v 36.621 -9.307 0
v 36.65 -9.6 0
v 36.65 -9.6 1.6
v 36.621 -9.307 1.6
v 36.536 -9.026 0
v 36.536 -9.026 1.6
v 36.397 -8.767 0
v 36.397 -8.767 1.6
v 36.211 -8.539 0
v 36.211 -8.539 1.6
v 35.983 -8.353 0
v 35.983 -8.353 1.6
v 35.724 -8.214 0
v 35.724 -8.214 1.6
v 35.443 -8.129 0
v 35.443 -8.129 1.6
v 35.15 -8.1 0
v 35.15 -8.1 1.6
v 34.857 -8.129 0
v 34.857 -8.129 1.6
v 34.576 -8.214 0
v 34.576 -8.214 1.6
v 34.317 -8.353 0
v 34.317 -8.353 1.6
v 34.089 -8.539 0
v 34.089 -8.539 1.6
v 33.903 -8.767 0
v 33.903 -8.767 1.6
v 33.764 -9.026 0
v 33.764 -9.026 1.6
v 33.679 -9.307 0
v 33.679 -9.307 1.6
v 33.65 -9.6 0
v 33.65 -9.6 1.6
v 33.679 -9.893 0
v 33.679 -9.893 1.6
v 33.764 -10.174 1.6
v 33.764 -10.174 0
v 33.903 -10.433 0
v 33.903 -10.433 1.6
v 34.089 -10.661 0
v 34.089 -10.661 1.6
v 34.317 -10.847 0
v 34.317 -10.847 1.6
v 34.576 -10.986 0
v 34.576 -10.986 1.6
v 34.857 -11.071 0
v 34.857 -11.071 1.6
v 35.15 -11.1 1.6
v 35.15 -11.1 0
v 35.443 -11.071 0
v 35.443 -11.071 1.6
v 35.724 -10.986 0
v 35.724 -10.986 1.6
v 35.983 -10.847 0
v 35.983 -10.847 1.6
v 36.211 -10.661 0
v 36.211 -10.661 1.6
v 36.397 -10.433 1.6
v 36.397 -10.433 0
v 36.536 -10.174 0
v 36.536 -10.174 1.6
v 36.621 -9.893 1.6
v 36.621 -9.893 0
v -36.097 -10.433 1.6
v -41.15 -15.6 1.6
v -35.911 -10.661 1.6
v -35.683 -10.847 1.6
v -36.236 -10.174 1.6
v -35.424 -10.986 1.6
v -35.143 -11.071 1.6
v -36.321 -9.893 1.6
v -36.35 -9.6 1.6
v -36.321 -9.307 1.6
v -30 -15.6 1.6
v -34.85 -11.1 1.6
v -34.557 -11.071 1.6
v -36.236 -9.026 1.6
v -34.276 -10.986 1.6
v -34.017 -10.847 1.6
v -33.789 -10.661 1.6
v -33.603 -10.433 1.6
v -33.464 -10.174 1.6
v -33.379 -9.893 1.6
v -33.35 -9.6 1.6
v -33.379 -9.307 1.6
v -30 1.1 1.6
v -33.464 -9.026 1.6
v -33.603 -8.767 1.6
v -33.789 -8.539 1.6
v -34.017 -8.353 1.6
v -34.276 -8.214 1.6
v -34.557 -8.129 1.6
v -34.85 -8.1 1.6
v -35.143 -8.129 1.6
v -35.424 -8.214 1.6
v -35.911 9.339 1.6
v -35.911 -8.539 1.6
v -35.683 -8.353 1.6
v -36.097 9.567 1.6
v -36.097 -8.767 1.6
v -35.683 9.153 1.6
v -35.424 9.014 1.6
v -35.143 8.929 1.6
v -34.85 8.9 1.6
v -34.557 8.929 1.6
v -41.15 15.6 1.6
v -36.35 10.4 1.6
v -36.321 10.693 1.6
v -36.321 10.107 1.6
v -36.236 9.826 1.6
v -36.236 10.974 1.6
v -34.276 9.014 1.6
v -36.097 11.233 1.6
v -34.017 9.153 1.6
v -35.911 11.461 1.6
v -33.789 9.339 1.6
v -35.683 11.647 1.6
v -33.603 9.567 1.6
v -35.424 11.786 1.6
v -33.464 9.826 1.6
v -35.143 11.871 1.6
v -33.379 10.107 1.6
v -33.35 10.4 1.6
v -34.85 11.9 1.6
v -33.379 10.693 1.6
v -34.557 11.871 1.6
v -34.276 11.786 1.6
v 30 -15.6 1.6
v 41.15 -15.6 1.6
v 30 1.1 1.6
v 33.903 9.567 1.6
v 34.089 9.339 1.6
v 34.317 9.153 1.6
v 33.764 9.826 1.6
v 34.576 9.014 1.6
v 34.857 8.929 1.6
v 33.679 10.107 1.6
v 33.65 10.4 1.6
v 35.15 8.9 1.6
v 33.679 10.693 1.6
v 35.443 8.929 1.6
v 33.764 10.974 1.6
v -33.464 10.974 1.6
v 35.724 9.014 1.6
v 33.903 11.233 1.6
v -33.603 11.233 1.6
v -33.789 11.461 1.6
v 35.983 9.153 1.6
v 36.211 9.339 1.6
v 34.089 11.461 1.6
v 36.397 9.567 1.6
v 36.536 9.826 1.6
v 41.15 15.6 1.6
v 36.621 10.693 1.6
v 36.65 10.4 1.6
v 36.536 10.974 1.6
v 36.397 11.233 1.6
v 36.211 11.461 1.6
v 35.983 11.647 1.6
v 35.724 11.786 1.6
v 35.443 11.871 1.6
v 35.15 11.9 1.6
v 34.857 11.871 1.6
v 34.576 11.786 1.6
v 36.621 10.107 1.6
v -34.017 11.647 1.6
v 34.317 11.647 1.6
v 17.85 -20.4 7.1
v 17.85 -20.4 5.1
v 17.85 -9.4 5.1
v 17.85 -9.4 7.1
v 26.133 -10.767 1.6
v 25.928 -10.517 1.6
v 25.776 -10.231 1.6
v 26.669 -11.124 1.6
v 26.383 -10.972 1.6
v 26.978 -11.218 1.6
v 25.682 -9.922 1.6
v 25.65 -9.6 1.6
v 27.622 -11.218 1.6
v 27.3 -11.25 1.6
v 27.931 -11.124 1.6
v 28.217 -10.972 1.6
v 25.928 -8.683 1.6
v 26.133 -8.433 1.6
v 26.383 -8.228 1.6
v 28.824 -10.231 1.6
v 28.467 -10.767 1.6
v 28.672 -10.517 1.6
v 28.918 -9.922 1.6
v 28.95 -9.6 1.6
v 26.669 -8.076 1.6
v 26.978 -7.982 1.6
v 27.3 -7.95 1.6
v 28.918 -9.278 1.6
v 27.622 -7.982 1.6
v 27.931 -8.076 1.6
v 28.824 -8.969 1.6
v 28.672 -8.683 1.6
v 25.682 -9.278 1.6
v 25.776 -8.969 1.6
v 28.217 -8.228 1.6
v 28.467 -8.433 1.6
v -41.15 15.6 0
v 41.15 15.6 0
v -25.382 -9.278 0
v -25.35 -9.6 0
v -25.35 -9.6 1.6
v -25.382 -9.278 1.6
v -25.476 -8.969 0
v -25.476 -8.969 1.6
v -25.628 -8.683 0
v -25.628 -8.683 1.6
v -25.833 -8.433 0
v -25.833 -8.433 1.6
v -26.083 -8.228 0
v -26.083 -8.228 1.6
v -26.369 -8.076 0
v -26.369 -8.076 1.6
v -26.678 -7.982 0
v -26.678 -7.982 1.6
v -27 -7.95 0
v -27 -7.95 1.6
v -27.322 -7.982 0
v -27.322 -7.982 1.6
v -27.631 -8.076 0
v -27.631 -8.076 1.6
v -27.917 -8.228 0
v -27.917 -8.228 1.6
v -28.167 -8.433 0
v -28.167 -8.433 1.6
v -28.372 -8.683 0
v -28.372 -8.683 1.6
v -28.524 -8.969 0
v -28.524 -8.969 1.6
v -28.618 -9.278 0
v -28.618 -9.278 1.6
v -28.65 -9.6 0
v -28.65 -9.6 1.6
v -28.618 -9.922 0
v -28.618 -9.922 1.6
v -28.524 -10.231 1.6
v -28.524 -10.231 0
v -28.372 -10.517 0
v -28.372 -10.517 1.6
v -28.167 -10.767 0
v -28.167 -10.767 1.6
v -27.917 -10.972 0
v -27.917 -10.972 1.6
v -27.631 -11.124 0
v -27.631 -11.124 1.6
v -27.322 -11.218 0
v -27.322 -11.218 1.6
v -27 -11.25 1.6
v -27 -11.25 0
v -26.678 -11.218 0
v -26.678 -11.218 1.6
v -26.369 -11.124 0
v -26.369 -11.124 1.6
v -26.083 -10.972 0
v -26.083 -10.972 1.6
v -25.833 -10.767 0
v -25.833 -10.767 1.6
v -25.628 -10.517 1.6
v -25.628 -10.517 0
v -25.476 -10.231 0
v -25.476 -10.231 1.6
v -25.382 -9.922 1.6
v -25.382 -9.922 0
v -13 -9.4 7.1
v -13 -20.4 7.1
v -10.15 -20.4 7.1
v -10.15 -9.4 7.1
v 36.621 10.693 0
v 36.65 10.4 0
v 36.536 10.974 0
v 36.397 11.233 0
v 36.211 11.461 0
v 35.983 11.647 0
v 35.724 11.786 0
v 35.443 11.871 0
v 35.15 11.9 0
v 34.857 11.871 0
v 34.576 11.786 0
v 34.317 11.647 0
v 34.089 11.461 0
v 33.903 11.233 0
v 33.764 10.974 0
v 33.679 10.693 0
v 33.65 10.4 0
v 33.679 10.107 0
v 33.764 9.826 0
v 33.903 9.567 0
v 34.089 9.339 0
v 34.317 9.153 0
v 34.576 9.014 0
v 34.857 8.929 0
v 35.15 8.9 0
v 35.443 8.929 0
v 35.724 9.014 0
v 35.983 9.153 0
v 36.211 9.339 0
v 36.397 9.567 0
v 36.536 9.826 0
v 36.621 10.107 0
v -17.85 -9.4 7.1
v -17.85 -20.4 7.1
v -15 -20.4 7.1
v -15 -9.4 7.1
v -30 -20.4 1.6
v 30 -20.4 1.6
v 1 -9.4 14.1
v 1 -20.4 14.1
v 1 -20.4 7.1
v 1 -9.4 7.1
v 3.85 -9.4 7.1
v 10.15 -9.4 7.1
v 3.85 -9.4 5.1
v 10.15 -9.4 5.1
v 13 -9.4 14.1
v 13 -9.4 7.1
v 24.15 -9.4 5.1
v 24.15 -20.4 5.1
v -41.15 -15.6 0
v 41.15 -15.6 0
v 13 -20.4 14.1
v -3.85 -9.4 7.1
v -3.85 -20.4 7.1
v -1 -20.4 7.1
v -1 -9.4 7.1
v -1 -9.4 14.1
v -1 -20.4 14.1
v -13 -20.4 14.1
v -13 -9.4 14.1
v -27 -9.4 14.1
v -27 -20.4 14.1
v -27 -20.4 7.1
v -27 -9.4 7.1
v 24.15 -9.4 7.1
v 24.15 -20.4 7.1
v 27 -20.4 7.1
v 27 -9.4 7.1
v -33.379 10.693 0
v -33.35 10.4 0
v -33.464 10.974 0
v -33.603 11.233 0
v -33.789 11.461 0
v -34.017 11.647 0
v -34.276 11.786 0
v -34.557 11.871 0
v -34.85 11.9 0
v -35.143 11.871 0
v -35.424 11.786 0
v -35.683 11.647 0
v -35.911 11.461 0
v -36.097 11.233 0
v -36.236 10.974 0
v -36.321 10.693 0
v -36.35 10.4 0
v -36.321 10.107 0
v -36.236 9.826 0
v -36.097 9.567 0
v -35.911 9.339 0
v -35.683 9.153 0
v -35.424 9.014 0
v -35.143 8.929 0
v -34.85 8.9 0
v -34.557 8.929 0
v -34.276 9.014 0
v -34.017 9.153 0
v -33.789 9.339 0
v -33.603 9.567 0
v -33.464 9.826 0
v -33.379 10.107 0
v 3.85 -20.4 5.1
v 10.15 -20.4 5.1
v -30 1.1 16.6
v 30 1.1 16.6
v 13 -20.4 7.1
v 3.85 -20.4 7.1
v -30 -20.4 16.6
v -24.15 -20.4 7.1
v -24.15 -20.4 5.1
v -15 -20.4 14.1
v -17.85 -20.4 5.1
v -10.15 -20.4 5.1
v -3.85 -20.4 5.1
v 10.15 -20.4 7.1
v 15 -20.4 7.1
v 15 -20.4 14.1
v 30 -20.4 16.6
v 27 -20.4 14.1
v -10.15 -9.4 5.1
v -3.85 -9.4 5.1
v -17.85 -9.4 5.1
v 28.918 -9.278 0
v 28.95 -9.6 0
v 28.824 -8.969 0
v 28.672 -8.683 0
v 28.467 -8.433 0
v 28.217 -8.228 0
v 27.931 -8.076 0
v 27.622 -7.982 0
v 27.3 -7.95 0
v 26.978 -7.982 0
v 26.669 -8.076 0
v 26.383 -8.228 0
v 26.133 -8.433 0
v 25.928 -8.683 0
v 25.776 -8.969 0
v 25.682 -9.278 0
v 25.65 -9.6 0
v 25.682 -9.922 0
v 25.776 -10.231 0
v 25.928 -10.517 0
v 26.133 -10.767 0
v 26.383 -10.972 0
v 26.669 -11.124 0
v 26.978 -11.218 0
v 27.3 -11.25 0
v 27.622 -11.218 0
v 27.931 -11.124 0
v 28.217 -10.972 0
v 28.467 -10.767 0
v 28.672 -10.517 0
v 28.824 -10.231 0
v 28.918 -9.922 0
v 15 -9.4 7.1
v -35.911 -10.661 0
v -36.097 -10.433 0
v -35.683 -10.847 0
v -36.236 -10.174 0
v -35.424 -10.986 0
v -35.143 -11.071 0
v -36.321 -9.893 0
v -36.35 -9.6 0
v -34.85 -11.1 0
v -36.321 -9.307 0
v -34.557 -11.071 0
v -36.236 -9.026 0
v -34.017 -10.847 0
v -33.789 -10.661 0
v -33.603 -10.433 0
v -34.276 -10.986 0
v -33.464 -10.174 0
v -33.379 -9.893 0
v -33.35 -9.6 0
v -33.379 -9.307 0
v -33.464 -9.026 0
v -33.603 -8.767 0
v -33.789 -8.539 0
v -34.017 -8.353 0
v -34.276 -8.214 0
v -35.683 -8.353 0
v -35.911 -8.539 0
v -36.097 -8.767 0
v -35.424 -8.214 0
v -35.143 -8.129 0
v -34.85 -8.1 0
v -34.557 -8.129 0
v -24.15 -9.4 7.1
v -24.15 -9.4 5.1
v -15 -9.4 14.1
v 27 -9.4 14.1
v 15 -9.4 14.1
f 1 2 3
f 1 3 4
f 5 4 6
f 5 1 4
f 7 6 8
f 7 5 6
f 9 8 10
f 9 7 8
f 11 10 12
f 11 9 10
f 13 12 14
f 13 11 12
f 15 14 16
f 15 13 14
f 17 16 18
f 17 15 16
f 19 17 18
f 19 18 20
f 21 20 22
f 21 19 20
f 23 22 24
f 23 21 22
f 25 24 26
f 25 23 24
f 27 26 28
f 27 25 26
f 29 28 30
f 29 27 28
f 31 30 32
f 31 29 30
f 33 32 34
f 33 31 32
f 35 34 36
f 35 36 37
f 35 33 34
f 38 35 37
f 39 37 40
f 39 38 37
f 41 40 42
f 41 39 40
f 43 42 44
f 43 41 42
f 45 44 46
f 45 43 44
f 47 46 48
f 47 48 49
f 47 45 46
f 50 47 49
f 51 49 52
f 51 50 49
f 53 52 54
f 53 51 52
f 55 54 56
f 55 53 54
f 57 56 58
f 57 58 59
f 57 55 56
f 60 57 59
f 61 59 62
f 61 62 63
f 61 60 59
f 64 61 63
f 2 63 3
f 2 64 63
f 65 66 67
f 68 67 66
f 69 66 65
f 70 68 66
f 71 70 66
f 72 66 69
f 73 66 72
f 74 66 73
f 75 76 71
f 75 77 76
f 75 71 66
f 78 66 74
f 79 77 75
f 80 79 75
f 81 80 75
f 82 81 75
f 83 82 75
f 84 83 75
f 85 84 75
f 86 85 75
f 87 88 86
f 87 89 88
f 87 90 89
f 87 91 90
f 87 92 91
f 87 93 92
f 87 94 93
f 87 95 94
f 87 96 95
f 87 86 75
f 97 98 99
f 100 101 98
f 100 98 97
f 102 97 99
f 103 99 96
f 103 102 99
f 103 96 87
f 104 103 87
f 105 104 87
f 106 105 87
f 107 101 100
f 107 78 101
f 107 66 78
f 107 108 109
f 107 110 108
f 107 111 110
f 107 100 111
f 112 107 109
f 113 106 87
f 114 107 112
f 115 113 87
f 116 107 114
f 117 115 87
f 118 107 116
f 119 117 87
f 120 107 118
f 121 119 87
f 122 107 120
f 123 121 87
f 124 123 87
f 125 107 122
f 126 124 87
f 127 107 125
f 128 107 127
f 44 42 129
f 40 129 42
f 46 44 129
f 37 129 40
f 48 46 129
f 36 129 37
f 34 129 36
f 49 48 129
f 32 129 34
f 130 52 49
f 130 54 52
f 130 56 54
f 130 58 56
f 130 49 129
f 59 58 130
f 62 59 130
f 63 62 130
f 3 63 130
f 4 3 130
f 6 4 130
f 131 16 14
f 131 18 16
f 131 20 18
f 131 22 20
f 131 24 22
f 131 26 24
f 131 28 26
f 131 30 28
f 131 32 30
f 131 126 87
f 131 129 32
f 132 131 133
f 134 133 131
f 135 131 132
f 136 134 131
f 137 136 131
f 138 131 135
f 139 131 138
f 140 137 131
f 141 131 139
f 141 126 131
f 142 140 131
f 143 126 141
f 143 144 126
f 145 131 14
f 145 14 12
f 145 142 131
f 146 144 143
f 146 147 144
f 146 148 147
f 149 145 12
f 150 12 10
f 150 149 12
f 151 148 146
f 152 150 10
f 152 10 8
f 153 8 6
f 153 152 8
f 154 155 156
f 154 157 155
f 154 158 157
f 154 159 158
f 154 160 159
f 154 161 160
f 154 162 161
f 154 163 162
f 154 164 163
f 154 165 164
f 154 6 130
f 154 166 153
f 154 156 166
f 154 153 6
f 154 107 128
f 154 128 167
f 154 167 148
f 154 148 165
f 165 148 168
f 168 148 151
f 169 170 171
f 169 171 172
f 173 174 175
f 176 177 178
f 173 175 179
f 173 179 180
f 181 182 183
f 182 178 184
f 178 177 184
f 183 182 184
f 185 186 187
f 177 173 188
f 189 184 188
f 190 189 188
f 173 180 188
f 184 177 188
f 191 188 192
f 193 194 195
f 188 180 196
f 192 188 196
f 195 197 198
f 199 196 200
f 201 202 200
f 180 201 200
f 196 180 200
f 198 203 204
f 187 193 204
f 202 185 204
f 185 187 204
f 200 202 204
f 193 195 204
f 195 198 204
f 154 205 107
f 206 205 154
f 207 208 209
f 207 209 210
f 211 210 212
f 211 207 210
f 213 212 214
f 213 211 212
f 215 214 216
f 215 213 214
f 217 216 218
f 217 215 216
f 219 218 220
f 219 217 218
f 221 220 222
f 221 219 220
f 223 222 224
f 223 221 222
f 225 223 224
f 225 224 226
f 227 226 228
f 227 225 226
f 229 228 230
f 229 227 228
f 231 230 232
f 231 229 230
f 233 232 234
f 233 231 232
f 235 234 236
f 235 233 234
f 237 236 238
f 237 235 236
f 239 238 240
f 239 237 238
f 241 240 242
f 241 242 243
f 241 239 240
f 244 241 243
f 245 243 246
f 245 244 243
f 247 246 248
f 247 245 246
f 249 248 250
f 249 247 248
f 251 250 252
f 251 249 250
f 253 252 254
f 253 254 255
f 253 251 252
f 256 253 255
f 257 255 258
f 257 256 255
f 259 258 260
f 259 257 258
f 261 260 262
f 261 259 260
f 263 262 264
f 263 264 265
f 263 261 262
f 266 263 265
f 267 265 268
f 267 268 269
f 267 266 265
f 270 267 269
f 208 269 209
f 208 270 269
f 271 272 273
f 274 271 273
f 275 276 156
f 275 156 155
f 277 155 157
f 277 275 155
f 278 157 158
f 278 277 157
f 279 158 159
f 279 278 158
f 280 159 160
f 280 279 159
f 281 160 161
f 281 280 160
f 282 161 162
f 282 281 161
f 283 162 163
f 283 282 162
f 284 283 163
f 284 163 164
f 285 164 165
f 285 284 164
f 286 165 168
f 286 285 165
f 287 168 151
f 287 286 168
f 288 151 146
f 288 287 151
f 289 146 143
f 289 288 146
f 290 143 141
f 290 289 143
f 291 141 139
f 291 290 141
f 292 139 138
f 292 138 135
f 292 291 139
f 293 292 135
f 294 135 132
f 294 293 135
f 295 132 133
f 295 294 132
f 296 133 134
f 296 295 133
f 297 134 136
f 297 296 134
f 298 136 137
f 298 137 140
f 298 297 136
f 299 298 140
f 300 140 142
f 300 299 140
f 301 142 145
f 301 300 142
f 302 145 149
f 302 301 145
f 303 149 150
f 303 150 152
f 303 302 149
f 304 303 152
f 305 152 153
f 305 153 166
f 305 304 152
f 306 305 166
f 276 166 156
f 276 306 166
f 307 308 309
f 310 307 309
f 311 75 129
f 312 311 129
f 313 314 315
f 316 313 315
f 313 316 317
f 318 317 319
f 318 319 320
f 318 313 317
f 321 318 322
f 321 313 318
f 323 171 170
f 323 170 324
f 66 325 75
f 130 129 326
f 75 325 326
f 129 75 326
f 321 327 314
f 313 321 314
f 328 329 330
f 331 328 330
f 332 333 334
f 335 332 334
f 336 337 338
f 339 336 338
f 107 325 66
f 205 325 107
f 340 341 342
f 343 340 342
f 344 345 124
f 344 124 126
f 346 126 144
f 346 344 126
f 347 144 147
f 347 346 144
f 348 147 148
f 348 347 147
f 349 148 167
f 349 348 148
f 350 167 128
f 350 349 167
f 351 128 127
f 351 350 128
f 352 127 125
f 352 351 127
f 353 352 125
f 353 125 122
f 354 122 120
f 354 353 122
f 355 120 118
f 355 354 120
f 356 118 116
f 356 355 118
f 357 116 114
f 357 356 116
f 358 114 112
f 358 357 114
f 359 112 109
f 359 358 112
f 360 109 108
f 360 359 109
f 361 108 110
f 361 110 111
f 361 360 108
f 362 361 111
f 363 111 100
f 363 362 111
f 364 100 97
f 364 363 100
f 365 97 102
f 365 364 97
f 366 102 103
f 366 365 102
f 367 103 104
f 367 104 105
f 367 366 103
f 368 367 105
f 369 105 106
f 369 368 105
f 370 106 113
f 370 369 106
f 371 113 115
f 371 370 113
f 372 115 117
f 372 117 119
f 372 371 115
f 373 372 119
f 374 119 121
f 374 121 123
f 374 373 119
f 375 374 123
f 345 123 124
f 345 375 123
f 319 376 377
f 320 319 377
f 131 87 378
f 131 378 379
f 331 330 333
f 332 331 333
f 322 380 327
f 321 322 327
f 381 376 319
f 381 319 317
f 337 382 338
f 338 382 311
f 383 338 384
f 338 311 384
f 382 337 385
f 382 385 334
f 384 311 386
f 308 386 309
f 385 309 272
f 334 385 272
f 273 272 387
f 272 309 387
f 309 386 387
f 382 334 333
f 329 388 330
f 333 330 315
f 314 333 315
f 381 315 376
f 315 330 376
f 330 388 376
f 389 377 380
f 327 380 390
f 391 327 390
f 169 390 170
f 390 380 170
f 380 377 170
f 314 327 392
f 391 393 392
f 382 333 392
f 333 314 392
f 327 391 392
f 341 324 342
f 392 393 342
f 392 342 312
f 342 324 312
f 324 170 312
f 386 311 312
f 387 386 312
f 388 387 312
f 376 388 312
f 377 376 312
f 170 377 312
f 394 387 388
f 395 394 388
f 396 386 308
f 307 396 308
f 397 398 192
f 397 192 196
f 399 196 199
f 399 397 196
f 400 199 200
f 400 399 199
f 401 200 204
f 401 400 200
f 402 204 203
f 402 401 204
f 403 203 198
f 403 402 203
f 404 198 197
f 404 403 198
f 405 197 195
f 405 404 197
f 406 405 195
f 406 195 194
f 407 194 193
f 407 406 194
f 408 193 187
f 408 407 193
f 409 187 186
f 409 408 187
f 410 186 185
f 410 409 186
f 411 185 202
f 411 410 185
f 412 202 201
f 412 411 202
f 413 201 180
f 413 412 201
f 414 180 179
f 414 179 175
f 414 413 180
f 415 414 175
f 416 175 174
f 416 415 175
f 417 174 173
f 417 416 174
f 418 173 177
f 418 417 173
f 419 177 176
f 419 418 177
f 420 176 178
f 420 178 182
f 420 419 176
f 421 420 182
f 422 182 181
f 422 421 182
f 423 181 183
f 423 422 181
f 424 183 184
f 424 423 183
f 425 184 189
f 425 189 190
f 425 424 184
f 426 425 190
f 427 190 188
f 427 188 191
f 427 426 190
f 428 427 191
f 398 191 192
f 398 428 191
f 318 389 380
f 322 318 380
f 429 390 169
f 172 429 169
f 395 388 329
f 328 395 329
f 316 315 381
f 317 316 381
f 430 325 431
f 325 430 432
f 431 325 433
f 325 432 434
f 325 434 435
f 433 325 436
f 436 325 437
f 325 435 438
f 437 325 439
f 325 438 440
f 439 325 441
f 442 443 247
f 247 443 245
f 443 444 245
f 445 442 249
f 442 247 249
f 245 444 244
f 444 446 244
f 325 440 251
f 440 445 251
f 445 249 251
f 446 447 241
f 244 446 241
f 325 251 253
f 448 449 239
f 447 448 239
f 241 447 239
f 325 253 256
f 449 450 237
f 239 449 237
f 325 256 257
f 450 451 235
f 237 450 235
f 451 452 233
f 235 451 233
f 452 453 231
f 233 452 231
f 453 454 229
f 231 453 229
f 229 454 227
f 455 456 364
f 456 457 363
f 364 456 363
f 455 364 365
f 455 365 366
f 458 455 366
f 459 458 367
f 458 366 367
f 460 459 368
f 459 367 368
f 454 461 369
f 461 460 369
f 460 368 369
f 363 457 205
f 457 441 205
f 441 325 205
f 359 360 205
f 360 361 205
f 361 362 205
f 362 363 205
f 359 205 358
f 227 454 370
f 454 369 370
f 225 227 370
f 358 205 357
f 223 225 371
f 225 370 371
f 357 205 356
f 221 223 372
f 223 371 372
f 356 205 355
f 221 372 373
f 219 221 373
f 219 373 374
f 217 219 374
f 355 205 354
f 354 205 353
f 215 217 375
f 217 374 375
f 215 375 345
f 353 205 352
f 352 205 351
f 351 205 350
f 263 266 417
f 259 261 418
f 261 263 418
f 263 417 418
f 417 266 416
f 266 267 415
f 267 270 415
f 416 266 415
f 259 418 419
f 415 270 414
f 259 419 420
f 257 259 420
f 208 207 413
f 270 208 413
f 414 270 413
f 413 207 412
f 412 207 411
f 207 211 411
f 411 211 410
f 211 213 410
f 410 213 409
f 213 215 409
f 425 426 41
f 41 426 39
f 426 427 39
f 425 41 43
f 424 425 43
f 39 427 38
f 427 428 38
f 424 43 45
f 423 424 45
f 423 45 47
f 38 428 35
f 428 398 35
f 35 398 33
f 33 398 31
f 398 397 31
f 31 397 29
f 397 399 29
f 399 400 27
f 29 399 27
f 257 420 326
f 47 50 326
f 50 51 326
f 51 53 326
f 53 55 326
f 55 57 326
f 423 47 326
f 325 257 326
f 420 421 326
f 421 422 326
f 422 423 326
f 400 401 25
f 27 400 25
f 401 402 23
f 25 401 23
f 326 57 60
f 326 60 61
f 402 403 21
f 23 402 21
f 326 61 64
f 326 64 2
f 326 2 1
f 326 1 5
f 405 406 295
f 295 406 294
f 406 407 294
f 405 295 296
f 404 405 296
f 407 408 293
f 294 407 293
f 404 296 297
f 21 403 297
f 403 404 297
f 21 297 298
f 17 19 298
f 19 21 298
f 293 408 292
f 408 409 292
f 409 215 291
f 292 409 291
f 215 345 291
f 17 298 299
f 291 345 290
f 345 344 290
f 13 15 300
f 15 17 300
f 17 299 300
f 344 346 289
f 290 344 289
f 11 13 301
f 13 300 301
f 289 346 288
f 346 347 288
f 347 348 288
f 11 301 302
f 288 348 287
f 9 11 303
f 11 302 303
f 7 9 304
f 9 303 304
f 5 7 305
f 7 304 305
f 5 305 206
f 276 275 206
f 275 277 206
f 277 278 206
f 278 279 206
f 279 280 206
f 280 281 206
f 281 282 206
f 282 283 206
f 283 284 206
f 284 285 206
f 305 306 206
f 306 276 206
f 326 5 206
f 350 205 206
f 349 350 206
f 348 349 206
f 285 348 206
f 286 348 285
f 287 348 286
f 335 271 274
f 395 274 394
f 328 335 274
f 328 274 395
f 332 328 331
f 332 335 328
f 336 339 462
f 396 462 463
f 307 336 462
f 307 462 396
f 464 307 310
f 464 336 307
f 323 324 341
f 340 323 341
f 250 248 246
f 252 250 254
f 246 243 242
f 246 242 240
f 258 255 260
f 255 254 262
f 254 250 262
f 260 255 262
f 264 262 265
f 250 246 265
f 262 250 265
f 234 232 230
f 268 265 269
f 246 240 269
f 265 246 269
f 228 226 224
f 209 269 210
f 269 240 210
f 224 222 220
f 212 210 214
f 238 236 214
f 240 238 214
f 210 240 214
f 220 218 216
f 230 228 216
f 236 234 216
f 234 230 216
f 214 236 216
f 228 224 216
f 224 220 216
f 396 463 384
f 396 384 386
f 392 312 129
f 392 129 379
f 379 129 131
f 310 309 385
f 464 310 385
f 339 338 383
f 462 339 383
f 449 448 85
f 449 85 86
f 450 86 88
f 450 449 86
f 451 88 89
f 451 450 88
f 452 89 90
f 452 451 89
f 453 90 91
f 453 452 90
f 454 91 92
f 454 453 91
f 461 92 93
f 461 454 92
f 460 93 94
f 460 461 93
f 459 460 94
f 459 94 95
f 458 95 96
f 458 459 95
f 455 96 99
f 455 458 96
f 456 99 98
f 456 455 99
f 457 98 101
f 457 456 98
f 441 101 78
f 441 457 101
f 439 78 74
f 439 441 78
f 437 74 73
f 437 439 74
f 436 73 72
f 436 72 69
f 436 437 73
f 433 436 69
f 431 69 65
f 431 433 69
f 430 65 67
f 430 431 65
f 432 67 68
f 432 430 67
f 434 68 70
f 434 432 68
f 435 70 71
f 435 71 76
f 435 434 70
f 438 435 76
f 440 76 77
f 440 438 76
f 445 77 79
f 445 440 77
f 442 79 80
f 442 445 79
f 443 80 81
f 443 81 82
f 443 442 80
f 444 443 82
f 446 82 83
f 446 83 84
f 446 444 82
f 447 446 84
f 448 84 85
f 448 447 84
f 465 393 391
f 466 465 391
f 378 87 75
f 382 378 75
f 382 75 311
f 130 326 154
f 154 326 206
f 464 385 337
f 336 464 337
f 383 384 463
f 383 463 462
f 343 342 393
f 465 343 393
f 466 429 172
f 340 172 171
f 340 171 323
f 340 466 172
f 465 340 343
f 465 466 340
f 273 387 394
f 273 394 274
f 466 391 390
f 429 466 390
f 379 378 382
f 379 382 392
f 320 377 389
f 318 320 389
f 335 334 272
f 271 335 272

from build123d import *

# Parameters (mm, degrees)
F0_W     = 82.3
F0_H     = 31.2
F0_R     = 1.5
F0_R_2   = 1.65
F1_DEPTH = 1.6
F2_W     = 60
F2_H     = 16.7
F2_R     = 1.65
F2_H_2   = 4.8
F3_DEPTH = 15
F4_W     = 6.3
F4_H     = 2
F5_DEPTH = 11


with BuildPart() as f1:
    # F0 (on Top) → F1 (new body)
    with BuildSketch(Plane.XY):
        Rectangle(F0_W, F0_H)
        with Locations((-34.85, -9.6)):
            Circle(F0_R, mode=Mode.SUBTRACT)
        with Locations((-27, -9.6)):
            Circle(F0_R_2, mode=Mode.SUBTRACT)
        with Locations((27.3, -9.6)):
            Circle(F0_R_2, mode=Mode.SUBTRACT)
        with Locations((35.15, -9.6)):
            Circle(F0_R, mode=Mode.SUBTRACT)
        with Locations((-34.85, 10.4)):
            Circle(F0_R, mode=Mode.SUBTRACT)
        with Locations((35.15, 10.4)):
            Circle(F0_R, mode=Mode.SUBTRACT)
    extrude(amount=F1_DEPTH)

    # F2 (on face) → F3 (join)
    with BuildSketch(Plane.XY.offset(1.6)):
        with Locations((0, -7.25)):
            Rectangle(F2_W, F2_H)
        with Locations((-27, -9.6)):
            Circle(F2_R, mode=Mode.SUBTRACT)
        with Locations((27.3, -9.6)):
            Circle(F2_R, mode=Mode.SUBTRACT)
        with Locations((0, -18)):
            Rectangle(F2_W, F2_H_2)
        with Locations((-27, -9.6)):
            Circle(F2_R)
        with Locations((27.3, -9.6)):
            Circle(F2_R)
    extrude(amount=F3_DEPTH)

    # F4 (on face) → F5 (cut)
    with BuildSketch(Plane.XZ.offset(20.4)):
        Polygon((-15, 14.1), (-27, 14.1), (-27, 7.1), (-24.1502, 7.1), (-17.8502, 7.1), (-15, 7.1), align=None)
        Polygon((-1, 14.1), (-13, 14.1), (-13, 7.1), (-10.1502, 7.1), (-3.8502, 7.1), (-1, 7.1), align=None)
        Polygon((13, 14.1), (1, 14.1), (1, 7.1), (3.8498, 7.1), (10.1498, 7.1), (13, 7.1), align=None)
        Polygon((27, 14.1), (15, 14.1), (15, 7.1), (17.8498, 7.1), (24.1498, 7.1), (27, 7.1), align=None)
        with Locations((20.9998, 6.1)):
            Rectangle(F4_W, F4_H)
        with Locations((6.9998, 6.1)):
            Rectangle(F4_W, F4_H)
        with Locations((-7.0002, 6.1)):
            Rectangle(F4_W, F4_H)
        with Locations((-21.0002, 6.1)):
            Rectangle(F4_W, F4_H)
    extrude(amount=-F5_DEPTH, mode=Mode.SUBTRACT)


solid = f1.part
